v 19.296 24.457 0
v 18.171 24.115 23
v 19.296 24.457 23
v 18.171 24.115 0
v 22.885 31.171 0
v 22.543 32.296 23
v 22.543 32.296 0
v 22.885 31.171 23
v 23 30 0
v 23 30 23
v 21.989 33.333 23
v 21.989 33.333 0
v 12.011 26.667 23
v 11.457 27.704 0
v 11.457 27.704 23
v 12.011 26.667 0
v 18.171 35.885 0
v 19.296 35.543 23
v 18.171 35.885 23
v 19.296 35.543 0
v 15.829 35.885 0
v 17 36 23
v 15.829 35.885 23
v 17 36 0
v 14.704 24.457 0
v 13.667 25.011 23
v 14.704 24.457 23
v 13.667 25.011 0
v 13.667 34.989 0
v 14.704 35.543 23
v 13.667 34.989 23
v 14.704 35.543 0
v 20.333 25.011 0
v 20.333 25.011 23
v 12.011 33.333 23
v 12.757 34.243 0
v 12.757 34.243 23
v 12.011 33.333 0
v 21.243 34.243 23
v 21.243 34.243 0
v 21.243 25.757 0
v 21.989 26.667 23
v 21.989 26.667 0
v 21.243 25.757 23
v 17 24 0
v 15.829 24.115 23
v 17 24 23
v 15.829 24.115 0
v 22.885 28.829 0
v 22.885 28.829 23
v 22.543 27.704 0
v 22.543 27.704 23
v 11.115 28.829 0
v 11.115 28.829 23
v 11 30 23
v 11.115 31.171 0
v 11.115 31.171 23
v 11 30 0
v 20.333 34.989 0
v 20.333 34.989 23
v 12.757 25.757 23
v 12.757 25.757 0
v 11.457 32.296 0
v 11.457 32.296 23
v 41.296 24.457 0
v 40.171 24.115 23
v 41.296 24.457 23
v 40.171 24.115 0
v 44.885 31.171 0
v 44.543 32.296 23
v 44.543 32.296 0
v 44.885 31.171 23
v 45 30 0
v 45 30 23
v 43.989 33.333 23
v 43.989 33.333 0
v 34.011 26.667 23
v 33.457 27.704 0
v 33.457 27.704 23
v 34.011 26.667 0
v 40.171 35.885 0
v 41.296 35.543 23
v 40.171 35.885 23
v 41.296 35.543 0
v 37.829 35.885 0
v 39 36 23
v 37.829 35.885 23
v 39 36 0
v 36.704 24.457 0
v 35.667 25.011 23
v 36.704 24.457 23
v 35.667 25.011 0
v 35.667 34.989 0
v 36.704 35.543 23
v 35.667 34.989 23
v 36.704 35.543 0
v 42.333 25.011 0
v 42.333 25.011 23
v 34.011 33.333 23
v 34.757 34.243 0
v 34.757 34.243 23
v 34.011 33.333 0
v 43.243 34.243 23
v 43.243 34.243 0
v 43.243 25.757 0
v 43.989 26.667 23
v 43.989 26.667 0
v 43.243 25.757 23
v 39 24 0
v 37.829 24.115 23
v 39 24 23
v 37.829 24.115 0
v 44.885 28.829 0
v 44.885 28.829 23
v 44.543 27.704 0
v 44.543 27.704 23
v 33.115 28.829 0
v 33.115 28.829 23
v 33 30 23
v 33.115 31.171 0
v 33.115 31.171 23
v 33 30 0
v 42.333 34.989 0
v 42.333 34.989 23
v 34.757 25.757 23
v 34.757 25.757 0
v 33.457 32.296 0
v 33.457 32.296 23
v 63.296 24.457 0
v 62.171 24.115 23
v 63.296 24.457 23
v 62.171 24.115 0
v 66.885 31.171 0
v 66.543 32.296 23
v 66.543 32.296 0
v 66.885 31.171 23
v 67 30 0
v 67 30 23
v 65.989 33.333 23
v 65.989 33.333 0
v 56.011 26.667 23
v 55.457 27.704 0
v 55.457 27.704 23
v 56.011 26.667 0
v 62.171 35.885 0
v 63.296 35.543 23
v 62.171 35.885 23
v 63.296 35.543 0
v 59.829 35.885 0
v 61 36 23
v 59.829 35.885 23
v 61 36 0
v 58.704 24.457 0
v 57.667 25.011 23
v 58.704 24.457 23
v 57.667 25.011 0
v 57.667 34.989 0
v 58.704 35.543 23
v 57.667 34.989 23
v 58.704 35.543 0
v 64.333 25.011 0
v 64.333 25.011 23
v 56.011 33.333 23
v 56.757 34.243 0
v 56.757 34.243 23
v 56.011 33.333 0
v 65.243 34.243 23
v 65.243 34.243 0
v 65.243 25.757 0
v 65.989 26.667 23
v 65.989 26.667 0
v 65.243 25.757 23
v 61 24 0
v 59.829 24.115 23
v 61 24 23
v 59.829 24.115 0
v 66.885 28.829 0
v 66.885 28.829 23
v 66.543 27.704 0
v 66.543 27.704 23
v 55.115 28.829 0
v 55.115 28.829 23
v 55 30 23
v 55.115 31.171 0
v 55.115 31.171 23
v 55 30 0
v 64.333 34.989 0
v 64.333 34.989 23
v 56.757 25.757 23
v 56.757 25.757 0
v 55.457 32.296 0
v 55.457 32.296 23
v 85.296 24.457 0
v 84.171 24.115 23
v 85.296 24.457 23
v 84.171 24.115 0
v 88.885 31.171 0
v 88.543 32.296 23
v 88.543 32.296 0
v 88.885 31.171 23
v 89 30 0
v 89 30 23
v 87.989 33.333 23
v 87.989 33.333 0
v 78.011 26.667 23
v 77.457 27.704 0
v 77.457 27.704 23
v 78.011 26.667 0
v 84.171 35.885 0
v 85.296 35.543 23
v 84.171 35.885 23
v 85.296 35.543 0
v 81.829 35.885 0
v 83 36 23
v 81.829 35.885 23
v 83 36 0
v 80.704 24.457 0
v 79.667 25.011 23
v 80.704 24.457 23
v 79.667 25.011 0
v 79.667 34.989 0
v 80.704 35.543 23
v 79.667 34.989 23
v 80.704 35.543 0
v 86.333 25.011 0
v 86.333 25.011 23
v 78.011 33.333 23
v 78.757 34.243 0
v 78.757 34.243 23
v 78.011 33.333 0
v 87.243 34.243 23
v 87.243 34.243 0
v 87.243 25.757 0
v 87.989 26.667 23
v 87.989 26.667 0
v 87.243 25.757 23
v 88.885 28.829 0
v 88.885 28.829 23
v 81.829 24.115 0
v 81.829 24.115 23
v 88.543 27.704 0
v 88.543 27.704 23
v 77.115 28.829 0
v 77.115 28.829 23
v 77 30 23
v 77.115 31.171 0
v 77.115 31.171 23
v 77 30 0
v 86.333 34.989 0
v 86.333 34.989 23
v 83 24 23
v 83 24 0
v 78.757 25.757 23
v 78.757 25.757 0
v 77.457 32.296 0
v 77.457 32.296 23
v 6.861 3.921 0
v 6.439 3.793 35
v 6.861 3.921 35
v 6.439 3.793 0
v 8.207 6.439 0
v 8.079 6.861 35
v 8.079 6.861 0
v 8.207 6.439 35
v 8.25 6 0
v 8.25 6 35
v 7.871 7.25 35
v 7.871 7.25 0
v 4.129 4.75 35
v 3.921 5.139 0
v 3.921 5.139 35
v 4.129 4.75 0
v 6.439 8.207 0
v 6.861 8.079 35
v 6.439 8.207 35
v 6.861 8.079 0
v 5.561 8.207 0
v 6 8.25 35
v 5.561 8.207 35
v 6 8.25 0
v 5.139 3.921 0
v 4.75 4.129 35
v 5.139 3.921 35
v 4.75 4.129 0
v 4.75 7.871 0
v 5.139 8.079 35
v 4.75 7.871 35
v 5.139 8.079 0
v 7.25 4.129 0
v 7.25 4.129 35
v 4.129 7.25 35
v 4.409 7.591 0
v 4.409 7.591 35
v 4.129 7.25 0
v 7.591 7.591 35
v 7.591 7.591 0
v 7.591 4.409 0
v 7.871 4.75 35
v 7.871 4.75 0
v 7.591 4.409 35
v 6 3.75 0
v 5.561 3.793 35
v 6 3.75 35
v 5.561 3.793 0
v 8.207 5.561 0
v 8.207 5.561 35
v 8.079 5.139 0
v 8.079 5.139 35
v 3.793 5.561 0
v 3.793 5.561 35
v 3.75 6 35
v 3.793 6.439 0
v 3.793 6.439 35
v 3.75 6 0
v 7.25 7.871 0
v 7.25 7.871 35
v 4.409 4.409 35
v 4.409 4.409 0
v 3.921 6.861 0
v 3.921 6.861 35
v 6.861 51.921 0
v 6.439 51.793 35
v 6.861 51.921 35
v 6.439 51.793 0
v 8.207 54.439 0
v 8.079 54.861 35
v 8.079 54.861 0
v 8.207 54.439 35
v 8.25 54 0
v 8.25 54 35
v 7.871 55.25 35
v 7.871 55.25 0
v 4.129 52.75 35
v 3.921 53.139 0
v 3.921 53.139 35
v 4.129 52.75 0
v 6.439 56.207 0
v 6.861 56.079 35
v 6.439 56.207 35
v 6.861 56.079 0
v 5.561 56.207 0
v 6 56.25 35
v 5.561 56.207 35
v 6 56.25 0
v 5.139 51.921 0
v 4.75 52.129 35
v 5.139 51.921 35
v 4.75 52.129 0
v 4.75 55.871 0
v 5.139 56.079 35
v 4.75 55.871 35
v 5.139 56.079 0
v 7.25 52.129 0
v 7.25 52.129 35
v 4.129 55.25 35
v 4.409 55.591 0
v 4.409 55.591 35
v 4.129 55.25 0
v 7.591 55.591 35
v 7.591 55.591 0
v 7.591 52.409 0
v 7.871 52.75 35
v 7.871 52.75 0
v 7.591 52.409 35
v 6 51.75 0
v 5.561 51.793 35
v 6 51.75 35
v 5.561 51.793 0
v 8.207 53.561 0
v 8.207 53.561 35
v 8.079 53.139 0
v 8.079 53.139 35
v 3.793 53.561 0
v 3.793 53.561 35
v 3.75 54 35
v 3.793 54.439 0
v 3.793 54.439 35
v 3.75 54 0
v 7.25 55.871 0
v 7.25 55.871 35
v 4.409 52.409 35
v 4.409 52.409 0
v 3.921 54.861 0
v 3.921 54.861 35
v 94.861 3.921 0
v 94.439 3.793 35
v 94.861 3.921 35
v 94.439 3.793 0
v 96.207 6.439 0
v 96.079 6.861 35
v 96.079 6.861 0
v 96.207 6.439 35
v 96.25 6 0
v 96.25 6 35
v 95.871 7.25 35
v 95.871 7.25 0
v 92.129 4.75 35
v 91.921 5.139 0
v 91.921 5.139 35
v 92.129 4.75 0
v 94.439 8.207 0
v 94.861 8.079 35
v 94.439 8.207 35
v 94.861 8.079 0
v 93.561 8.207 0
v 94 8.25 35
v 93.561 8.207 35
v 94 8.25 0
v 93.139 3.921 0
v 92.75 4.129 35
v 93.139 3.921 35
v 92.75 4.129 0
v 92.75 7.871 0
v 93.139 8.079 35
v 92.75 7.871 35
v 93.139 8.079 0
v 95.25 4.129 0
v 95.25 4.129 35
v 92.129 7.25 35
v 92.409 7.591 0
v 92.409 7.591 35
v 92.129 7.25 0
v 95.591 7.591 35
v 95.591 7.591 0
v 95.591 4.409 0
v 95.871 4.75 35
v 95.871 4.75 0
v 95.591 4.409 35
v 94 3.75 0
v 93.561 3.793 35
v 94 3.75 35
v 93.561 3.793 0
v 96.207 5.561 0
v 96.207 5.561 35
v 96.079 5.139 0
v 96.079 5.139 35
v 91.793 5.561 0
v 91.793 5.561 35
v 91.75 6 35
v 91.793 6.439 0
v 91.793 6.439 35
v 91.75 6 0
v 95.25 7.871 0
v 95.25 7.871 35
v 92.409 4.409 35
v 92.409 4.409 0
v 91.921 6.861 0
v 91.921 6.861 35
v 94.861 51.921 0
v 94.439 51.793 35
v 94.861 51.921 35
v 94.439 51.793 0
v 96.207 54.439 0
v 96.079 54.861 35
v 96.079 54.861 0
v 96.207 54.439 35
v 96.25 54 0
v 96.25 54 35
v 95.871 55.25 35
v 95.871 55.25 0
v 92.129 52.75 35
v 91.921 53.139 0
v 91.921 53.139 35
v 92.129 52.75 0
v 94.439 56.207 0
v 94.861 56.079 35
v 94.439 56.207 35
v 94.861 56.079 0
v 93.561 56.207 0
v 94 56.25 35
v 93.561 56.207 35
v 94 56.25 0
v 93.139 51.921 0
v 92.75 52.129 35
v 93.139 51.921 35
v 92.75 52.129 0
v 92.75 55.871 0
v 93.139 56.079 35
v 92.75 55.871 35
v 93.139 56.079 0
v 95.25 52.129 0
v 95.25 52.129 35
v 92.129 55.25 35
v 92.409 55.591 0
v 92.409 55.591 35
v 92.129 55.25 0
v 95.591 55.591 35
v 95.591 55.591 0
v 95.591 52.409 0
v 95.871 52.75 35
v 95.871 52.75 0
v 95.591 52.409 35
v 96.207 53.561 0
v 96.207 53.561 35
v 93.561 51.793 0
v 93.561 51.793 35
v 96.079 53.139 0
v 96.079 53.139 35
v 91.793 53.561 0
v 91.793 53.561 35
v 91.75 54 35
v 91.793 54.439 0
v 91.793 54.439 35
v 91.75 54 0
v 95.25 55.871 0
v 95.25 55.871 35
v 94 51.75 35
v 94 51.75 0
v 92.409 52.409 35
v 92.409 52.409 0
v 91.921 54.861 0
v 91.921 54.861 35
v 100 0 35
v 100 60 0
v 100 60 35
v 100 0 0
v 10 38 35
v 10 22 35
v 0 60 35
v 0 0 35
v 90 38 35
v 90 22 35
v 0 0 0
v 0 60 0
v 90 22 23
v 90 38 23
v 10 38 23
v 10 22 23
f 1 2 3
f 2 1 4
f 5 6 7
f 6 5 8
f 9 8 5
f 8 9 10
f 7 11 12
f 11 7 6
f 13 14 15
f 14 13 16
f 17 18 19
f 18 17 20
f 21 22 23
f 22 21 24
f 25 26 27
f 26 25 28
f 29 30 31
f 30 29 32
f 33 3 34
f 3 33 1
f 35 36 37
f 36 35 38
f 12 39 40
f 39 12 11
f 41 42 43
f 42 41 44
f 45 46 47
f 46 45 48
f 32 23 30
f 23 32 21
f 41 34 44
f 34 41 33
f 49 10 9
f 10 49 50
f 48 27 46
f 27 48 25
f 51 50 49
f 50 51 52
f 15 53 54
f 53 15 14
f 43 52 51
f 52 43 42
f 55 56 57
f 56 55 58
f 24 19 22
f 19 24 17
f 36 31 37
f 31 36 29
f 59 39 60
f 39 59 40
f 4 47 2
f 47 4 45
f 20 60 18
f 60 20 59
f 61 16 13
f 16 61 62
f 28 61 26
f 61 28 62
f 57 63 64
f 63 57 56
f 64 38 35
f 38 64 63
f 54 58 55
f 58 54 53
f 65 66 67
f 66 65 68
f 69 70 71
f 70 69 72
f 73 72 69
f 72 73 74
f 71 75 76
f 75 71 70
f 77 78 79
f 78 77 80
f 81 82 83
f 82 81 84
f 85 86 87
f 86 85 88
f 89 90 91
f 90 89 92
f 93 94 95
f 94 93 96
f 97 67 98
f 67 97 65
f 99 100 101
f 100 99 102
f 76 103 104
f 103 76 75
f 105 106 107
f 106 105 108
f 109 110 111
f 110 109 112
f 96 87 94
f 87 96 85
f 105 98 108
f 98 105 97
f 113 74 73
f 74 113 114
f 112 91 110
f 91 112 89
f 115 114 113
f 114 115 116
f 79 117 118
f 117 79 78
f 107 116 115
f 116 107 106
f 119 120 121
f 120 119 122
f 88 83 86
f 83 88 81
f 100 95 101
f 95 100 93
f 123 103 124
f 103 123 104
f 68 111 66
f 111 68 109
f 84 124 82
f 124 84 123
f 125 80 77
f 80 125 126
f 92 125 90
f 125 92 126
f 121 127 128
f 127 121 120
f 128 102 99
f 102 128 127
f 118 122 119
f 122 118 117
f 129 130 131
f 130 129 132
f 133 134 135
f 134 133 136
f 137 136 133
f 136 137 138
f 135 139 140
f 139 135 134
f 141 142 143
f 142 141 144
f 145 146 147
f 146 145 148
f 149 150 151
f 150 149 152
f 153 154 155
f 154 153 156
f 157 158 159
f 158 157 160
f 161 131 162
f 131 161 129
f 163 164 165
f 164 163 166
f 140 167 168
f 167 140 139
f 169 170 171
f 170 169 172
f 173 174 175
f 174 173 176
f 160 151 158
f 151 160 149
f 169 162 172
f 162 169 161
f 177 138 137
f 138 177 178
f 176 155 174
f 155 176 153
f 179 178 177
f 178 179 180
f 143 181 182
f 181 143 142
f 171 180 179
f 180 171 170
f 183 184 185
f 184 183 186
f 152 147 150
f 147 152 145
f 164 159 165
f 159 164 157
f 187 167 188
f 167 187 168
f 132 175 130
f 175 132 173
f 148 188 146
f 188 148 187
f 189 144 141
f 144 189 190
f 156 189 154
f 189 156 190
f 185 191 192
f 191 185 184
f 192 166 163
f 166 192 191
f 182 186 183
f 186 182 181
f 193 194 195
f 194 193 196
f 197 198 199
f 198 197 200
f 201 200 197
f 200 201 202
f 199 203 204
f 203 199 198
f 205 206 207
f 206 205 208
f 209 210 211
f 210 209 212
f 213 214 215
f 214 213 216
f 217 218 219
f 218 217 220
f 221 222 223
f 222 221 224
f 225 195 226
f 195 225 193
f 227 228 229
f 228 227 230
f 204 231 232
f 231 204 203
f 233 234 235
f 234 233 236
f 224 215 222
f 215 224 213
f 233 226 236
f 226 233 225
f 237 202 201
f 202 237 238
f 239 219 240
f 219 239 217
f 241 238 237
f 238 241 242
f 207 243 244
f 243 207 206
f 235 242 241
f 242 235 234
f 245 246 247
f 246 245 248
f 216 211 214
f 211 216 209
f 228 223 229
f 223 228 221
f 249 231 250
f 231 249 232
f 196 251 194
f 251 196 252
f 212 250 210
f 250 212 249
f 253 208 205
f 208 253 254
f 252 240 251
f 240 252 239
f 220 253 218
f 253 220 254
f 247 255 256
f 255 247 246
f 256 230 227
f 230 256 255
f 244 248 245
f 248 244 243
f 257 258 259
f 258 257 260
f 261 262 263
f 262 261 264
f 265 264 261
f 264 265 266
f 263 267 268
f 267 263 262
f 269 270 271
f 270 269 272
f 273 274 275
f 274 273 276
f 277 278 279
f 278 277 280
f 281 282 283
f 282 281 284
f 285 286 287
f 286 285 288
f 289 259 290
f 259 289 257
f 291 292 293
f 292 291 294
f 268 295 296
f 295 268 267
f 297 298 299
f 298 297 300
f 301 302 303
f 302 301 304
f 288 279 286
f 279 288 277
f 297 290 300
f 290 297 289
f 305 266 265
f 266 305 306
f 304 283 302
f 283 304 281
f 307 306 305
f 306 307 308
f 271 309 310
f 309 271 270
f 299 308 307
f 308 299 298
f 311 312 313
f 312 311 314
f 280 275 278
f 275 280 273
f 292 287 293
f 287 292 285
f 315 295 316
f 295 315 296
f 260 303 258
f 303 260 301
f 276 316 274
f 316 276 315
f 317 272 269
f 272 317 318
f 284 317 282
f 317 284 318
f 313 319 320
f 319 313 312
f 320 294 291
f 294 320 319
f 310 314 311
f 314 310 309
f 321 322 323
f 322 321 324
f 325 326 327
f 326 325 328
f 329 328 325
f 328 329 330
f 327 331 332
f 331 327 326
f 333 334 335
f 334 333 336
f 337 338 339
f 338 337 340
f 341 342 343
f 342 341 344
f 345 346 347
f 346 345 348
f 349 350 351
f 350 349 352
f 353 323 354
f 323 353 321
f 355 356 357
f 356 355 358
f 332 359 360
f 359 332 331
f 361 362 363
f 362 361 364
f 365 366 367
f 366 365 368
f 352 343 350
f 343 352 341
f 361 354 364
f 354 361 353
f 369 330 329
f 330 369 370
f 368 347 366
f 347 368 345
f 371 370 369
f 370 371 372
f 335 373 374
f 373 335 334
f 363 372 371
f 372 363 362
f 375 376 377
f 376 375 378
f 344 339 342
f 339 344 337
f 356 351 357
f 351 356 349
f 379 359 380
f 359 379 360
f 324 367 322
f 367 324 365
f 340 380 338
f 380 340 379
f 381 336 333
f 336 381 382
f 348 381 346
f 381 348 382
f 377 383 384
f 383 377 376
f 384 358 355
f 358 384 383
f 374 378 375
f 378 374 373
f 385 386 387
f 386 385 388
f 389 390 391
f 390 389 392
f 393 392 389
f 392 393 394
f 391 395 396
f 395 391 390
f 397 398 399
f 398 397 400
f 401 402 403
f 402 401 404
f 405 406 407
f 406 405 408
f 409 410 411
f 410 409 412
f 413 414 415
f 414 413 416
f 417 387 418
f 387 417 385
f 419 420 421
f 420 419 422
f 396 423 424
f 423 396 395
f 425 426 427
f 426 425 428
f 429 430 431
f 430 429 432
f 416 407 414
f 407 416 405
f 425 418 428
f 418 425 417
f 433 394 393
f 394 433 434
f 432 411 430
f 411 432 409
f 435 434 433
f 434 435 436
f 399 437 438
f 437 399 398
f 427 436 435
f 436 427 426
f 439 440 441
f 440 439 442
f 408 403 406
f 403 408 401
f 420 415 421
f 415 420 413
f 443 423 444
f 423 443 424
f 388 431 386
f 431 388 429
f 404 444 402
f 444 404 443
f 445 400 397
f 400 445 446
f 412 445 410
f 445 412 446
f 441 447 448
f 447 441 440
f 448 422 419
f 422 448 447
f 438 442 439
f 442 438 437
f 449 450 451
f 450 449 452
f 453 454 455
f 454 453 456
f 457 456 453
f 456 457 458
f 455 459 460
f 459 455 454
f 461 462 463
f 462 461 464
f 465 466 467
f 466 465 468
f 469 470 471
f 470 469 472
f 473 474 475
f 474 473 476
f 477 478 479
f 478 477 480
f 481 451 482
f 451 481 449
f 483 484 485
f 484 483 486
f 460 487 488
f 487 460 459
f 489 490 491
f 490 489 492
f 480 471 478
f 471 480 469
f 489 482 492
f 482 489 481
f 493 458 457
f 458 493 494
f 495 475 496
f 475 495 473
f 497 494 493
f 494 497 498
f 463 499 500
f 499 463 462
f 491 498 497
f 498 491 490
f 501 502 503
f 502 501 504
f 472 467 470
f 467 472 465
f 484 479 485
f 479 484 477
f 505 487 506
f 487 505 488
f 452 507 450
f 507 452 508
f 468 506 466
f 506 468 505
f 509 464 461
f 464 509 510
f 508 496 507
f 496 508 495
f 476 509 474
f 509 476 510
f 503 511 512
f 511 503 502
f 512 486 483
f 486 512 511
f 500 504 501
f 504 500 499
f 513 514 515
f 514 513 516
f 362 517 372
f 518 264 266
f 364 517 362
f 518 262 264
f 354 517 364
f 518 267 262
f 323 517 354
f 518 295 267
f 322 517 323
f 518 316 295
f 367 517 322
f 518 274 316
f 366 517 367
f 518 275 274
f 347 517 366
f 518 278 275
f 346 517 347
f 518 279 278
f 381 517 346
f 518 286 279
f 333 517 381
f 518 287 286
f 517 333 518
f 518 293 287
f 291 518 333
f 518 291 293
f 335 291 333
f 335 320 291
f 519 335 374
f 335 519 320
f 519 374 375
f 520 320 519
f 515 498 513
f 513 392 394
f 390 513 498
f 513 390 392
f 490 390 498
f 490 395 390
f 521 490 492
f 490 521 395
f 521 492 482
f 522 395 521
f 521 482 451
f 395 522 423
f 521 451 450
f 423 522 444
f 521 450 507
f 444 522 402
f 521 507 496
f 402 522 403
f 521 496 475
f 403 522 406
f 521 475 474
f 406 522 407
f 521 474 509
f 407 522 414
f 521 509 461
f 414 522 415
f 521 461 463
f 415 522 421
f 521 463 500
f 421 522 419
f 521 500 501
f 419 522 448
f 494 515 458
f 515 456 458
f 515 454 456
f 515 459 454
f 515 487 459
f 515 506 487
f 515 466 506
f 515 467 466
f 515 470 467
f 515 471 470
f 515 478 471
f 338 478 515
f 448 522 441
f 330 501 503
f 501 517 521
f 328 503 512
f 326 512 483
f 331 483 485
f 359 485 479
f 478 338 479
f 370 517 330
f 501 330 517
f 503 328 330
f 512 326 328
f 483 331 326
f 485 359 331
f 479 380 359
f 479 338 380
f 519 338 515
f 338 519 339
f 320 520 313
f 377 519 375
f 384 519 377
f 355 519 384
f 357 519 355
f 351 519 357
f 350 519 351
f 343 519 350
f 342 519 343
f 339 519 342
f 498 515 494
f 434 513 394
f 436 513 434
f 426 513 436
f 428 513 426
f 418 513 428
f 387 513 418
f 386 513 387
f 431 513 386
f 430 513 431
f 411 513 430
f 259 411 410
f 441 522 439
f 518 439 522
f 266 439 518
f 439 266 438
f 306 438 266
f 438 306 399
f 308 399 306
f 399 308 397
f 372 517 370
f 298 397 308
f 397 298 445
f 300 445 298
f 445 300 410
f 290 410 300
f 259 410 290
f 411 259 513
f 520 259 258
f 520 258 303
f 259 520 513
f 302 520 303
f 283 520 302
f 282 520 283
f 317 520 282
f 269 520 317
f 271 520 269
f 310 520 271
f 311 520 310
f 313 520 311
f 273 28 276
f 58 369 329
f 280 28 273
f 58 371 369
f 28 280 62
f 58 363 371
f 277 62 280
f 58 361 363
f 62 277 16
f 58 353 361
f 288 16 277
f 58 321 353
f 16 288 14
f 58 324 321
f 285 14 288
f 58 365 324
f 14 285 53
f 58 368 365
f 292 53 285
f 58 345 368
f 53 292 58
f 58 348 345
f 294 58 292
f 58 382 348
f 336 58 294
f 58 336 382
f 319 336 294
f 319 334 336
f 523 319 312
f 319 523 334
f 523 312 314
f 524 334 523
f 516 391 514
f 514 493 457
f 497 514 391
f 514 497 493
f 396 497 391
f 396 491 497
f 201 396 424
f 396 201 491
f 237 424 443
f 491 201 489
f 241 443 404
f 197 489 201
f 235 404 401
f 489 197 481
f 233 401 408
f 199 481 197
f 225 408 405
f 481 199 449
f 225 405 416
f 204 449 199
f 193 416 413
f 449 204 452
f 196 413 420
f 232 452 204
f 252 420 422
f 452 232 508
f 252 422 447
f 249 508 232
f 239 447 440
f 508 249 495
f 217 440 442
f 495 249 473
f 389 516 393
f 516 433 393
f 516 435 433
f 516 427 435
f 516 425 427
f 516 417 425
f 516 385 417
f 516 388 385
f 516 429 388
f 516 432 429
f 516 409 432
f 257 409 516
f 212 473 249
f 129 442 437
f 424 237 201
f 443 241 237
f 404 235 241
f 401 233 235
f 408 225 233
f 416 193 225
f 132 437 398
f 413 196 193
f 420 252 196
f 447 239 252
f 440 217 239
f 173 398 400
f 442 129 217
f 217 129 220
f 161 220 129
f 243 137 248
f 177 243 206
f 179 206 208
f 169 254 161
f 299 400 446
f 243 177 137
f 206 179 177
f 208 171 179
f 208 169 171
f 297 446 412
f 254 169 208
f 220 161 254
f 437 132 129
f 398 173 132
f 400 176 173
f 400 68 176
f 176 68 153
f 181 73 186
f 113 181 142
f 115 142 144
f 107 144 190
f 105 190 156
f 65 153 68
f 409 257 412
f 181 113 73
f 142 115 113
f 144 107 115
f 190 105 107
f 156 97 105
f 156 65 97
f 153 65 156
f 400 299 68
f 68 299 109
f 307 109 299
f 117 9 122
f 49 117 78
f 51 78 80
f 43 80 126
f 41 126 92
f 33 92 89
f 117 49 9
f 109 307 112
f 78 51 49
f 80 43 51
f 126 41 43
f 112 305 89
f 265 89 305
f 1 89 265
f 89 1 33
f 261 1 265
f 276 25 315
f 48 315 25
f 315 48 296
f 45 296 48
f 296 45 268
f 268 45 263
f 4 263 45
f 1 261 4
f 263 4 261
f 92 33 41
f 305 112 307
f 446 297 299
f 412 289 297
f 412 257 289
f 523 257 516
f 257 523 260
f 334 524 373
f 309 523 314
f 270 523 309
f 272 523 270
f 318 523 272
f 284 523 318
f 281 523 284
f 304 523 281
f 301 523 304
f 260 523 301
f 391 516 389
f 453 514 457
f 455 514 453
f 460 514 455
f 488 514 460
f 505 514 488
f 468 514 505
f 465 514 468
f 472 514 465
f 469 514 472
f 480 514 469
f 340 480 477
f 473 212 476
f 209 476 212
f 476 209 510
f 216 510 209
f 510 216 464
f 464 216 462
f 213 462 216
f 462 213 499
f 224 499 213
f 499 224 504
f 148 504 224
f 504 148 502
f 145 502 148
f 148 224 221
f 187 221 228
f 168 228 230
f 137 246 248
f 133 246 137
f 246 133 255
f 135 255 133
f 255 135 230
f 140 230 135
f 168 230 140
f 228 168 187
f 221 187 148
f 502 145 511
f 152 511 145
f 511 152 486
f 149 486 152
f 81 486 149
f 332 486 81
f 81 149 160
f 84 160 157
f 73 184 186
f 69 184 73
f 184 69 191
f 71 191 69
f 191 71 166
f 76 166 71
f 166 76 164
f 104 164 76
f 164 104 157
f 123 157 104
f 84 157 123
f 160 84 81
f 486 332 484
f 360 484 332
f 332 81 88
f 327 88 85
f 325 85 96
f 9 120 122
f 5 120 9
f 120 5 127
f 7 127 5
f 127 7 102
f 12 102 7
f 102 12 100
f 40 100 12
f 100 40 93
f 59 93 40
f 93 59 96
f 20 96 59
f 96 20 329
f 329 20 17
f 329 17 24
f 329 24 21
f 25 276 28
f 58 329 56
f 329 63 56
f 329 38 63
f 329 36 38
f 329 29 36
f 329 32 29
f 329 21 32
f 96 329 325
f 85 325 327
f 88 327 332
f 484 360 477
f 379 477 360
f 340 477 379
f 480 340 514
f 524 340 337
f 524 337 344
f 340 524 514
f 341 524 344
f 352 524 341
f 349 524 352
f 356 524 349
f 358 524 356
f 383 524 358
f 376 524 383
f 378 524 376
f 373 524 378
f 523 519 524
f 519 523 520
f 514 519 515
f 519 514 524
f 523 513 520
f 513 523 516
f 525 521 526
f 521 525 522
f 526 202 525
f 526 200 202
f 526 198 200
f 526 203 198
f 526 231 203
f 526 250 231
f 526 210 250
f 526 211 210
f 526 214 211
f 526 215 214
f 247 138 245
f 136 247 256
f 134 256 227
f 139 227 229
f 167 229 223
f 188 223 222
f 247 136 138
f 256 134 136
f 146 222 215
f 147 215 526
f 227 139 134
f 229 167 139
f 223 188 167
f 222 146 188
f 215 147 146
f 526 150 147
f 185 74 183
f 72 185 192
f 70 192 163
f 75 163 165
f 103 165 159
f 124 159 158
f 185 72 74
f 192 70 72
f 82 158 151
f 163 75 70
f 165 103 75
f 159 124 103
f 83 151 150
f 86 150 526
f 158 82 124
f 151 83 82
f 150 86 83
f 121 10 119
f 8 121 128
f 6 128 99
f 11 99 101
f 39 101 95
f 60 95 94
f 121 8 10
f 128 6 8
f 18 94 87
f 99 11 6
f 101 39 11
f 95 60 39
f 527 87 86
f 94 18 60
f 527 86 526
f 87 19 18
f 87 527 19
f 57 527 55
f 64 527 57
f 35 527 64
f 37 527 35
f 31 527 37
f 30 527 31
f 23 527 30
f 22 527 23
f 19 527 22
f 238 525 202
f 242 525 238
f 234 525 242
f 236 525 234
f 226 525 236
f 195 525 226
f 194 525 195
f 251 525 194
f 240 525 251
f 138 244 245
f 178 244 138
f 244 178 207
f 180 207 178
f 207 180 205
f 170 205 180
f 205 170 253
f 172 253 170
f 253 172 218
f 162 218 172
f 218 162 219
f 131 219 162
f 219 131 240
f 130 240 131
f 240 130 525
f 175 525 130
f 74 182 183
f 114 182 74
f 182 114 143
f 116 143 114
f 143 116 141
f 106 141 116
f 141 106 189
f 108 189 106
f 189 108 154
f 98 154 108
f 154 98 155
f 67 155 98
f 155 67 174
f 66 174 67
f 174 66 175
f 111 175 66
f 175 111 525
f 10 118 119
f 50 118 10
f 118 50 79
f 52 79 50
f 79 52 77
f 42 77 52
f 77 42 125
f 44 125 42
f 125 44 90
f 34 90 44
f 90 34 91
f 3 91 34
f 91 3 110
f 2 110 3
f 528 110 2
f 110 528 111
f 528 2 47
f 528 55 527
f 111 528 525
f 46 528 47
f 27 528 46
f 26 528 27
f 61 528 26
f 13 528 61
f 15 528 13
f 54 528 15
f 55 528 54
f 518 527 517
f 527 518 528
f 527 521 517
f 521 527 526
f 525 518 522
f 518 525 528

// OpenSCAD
$fn = 32;

// ----------------------------------------------------------------------
// Manifold block: gallery_top manifold
// ----------------------------------------------------------------------

// --- parameters (mm) ---
block_l = 100;            // block length, X
block_w = 60;             // block width, Y
block_h = 35;             // block height, Z
port_d = 12;              // port bore diameter
port_pitch = 22;          // port pitch along X
gallery_d = 16;           // top gallery width, Y
gallery_depth = 12;       // gallery pocket depth
wall_p = 10;              // gallery end wall thickness, X
mnt_d = 4.5;              // mounting hole diameter
mnt_in = 6;               // mounting hole inset from the edges

n_ports = 4;  // ports in the row
port_x0 = (block_l - (n_ports - 1) * port_pitch) / 2;  // first port X

difference() {
  cube([block_l, block_w, block_h]);
  for (i = [0 : n_ports - 1])
    translate([port_x0 + i * port_pitch, block_w / 2, -1])
      cylinder(h = block_h + 2, d = port_d);
  translate([wall_p, block_w / 2 - gallery_d / 2, block_h - gallery_depth])
    cube([block_l - 2 * wall_p, gallery_d, gallery_depth + 1]);
  for (cx = [mnt_in, block_l - mnt_in])
    for (cy = [mnt_in, block_w - mnt_in])
      translate([cx, cy, -1]) cylinder(h = block_h + 2, d = mnt_d);
}
